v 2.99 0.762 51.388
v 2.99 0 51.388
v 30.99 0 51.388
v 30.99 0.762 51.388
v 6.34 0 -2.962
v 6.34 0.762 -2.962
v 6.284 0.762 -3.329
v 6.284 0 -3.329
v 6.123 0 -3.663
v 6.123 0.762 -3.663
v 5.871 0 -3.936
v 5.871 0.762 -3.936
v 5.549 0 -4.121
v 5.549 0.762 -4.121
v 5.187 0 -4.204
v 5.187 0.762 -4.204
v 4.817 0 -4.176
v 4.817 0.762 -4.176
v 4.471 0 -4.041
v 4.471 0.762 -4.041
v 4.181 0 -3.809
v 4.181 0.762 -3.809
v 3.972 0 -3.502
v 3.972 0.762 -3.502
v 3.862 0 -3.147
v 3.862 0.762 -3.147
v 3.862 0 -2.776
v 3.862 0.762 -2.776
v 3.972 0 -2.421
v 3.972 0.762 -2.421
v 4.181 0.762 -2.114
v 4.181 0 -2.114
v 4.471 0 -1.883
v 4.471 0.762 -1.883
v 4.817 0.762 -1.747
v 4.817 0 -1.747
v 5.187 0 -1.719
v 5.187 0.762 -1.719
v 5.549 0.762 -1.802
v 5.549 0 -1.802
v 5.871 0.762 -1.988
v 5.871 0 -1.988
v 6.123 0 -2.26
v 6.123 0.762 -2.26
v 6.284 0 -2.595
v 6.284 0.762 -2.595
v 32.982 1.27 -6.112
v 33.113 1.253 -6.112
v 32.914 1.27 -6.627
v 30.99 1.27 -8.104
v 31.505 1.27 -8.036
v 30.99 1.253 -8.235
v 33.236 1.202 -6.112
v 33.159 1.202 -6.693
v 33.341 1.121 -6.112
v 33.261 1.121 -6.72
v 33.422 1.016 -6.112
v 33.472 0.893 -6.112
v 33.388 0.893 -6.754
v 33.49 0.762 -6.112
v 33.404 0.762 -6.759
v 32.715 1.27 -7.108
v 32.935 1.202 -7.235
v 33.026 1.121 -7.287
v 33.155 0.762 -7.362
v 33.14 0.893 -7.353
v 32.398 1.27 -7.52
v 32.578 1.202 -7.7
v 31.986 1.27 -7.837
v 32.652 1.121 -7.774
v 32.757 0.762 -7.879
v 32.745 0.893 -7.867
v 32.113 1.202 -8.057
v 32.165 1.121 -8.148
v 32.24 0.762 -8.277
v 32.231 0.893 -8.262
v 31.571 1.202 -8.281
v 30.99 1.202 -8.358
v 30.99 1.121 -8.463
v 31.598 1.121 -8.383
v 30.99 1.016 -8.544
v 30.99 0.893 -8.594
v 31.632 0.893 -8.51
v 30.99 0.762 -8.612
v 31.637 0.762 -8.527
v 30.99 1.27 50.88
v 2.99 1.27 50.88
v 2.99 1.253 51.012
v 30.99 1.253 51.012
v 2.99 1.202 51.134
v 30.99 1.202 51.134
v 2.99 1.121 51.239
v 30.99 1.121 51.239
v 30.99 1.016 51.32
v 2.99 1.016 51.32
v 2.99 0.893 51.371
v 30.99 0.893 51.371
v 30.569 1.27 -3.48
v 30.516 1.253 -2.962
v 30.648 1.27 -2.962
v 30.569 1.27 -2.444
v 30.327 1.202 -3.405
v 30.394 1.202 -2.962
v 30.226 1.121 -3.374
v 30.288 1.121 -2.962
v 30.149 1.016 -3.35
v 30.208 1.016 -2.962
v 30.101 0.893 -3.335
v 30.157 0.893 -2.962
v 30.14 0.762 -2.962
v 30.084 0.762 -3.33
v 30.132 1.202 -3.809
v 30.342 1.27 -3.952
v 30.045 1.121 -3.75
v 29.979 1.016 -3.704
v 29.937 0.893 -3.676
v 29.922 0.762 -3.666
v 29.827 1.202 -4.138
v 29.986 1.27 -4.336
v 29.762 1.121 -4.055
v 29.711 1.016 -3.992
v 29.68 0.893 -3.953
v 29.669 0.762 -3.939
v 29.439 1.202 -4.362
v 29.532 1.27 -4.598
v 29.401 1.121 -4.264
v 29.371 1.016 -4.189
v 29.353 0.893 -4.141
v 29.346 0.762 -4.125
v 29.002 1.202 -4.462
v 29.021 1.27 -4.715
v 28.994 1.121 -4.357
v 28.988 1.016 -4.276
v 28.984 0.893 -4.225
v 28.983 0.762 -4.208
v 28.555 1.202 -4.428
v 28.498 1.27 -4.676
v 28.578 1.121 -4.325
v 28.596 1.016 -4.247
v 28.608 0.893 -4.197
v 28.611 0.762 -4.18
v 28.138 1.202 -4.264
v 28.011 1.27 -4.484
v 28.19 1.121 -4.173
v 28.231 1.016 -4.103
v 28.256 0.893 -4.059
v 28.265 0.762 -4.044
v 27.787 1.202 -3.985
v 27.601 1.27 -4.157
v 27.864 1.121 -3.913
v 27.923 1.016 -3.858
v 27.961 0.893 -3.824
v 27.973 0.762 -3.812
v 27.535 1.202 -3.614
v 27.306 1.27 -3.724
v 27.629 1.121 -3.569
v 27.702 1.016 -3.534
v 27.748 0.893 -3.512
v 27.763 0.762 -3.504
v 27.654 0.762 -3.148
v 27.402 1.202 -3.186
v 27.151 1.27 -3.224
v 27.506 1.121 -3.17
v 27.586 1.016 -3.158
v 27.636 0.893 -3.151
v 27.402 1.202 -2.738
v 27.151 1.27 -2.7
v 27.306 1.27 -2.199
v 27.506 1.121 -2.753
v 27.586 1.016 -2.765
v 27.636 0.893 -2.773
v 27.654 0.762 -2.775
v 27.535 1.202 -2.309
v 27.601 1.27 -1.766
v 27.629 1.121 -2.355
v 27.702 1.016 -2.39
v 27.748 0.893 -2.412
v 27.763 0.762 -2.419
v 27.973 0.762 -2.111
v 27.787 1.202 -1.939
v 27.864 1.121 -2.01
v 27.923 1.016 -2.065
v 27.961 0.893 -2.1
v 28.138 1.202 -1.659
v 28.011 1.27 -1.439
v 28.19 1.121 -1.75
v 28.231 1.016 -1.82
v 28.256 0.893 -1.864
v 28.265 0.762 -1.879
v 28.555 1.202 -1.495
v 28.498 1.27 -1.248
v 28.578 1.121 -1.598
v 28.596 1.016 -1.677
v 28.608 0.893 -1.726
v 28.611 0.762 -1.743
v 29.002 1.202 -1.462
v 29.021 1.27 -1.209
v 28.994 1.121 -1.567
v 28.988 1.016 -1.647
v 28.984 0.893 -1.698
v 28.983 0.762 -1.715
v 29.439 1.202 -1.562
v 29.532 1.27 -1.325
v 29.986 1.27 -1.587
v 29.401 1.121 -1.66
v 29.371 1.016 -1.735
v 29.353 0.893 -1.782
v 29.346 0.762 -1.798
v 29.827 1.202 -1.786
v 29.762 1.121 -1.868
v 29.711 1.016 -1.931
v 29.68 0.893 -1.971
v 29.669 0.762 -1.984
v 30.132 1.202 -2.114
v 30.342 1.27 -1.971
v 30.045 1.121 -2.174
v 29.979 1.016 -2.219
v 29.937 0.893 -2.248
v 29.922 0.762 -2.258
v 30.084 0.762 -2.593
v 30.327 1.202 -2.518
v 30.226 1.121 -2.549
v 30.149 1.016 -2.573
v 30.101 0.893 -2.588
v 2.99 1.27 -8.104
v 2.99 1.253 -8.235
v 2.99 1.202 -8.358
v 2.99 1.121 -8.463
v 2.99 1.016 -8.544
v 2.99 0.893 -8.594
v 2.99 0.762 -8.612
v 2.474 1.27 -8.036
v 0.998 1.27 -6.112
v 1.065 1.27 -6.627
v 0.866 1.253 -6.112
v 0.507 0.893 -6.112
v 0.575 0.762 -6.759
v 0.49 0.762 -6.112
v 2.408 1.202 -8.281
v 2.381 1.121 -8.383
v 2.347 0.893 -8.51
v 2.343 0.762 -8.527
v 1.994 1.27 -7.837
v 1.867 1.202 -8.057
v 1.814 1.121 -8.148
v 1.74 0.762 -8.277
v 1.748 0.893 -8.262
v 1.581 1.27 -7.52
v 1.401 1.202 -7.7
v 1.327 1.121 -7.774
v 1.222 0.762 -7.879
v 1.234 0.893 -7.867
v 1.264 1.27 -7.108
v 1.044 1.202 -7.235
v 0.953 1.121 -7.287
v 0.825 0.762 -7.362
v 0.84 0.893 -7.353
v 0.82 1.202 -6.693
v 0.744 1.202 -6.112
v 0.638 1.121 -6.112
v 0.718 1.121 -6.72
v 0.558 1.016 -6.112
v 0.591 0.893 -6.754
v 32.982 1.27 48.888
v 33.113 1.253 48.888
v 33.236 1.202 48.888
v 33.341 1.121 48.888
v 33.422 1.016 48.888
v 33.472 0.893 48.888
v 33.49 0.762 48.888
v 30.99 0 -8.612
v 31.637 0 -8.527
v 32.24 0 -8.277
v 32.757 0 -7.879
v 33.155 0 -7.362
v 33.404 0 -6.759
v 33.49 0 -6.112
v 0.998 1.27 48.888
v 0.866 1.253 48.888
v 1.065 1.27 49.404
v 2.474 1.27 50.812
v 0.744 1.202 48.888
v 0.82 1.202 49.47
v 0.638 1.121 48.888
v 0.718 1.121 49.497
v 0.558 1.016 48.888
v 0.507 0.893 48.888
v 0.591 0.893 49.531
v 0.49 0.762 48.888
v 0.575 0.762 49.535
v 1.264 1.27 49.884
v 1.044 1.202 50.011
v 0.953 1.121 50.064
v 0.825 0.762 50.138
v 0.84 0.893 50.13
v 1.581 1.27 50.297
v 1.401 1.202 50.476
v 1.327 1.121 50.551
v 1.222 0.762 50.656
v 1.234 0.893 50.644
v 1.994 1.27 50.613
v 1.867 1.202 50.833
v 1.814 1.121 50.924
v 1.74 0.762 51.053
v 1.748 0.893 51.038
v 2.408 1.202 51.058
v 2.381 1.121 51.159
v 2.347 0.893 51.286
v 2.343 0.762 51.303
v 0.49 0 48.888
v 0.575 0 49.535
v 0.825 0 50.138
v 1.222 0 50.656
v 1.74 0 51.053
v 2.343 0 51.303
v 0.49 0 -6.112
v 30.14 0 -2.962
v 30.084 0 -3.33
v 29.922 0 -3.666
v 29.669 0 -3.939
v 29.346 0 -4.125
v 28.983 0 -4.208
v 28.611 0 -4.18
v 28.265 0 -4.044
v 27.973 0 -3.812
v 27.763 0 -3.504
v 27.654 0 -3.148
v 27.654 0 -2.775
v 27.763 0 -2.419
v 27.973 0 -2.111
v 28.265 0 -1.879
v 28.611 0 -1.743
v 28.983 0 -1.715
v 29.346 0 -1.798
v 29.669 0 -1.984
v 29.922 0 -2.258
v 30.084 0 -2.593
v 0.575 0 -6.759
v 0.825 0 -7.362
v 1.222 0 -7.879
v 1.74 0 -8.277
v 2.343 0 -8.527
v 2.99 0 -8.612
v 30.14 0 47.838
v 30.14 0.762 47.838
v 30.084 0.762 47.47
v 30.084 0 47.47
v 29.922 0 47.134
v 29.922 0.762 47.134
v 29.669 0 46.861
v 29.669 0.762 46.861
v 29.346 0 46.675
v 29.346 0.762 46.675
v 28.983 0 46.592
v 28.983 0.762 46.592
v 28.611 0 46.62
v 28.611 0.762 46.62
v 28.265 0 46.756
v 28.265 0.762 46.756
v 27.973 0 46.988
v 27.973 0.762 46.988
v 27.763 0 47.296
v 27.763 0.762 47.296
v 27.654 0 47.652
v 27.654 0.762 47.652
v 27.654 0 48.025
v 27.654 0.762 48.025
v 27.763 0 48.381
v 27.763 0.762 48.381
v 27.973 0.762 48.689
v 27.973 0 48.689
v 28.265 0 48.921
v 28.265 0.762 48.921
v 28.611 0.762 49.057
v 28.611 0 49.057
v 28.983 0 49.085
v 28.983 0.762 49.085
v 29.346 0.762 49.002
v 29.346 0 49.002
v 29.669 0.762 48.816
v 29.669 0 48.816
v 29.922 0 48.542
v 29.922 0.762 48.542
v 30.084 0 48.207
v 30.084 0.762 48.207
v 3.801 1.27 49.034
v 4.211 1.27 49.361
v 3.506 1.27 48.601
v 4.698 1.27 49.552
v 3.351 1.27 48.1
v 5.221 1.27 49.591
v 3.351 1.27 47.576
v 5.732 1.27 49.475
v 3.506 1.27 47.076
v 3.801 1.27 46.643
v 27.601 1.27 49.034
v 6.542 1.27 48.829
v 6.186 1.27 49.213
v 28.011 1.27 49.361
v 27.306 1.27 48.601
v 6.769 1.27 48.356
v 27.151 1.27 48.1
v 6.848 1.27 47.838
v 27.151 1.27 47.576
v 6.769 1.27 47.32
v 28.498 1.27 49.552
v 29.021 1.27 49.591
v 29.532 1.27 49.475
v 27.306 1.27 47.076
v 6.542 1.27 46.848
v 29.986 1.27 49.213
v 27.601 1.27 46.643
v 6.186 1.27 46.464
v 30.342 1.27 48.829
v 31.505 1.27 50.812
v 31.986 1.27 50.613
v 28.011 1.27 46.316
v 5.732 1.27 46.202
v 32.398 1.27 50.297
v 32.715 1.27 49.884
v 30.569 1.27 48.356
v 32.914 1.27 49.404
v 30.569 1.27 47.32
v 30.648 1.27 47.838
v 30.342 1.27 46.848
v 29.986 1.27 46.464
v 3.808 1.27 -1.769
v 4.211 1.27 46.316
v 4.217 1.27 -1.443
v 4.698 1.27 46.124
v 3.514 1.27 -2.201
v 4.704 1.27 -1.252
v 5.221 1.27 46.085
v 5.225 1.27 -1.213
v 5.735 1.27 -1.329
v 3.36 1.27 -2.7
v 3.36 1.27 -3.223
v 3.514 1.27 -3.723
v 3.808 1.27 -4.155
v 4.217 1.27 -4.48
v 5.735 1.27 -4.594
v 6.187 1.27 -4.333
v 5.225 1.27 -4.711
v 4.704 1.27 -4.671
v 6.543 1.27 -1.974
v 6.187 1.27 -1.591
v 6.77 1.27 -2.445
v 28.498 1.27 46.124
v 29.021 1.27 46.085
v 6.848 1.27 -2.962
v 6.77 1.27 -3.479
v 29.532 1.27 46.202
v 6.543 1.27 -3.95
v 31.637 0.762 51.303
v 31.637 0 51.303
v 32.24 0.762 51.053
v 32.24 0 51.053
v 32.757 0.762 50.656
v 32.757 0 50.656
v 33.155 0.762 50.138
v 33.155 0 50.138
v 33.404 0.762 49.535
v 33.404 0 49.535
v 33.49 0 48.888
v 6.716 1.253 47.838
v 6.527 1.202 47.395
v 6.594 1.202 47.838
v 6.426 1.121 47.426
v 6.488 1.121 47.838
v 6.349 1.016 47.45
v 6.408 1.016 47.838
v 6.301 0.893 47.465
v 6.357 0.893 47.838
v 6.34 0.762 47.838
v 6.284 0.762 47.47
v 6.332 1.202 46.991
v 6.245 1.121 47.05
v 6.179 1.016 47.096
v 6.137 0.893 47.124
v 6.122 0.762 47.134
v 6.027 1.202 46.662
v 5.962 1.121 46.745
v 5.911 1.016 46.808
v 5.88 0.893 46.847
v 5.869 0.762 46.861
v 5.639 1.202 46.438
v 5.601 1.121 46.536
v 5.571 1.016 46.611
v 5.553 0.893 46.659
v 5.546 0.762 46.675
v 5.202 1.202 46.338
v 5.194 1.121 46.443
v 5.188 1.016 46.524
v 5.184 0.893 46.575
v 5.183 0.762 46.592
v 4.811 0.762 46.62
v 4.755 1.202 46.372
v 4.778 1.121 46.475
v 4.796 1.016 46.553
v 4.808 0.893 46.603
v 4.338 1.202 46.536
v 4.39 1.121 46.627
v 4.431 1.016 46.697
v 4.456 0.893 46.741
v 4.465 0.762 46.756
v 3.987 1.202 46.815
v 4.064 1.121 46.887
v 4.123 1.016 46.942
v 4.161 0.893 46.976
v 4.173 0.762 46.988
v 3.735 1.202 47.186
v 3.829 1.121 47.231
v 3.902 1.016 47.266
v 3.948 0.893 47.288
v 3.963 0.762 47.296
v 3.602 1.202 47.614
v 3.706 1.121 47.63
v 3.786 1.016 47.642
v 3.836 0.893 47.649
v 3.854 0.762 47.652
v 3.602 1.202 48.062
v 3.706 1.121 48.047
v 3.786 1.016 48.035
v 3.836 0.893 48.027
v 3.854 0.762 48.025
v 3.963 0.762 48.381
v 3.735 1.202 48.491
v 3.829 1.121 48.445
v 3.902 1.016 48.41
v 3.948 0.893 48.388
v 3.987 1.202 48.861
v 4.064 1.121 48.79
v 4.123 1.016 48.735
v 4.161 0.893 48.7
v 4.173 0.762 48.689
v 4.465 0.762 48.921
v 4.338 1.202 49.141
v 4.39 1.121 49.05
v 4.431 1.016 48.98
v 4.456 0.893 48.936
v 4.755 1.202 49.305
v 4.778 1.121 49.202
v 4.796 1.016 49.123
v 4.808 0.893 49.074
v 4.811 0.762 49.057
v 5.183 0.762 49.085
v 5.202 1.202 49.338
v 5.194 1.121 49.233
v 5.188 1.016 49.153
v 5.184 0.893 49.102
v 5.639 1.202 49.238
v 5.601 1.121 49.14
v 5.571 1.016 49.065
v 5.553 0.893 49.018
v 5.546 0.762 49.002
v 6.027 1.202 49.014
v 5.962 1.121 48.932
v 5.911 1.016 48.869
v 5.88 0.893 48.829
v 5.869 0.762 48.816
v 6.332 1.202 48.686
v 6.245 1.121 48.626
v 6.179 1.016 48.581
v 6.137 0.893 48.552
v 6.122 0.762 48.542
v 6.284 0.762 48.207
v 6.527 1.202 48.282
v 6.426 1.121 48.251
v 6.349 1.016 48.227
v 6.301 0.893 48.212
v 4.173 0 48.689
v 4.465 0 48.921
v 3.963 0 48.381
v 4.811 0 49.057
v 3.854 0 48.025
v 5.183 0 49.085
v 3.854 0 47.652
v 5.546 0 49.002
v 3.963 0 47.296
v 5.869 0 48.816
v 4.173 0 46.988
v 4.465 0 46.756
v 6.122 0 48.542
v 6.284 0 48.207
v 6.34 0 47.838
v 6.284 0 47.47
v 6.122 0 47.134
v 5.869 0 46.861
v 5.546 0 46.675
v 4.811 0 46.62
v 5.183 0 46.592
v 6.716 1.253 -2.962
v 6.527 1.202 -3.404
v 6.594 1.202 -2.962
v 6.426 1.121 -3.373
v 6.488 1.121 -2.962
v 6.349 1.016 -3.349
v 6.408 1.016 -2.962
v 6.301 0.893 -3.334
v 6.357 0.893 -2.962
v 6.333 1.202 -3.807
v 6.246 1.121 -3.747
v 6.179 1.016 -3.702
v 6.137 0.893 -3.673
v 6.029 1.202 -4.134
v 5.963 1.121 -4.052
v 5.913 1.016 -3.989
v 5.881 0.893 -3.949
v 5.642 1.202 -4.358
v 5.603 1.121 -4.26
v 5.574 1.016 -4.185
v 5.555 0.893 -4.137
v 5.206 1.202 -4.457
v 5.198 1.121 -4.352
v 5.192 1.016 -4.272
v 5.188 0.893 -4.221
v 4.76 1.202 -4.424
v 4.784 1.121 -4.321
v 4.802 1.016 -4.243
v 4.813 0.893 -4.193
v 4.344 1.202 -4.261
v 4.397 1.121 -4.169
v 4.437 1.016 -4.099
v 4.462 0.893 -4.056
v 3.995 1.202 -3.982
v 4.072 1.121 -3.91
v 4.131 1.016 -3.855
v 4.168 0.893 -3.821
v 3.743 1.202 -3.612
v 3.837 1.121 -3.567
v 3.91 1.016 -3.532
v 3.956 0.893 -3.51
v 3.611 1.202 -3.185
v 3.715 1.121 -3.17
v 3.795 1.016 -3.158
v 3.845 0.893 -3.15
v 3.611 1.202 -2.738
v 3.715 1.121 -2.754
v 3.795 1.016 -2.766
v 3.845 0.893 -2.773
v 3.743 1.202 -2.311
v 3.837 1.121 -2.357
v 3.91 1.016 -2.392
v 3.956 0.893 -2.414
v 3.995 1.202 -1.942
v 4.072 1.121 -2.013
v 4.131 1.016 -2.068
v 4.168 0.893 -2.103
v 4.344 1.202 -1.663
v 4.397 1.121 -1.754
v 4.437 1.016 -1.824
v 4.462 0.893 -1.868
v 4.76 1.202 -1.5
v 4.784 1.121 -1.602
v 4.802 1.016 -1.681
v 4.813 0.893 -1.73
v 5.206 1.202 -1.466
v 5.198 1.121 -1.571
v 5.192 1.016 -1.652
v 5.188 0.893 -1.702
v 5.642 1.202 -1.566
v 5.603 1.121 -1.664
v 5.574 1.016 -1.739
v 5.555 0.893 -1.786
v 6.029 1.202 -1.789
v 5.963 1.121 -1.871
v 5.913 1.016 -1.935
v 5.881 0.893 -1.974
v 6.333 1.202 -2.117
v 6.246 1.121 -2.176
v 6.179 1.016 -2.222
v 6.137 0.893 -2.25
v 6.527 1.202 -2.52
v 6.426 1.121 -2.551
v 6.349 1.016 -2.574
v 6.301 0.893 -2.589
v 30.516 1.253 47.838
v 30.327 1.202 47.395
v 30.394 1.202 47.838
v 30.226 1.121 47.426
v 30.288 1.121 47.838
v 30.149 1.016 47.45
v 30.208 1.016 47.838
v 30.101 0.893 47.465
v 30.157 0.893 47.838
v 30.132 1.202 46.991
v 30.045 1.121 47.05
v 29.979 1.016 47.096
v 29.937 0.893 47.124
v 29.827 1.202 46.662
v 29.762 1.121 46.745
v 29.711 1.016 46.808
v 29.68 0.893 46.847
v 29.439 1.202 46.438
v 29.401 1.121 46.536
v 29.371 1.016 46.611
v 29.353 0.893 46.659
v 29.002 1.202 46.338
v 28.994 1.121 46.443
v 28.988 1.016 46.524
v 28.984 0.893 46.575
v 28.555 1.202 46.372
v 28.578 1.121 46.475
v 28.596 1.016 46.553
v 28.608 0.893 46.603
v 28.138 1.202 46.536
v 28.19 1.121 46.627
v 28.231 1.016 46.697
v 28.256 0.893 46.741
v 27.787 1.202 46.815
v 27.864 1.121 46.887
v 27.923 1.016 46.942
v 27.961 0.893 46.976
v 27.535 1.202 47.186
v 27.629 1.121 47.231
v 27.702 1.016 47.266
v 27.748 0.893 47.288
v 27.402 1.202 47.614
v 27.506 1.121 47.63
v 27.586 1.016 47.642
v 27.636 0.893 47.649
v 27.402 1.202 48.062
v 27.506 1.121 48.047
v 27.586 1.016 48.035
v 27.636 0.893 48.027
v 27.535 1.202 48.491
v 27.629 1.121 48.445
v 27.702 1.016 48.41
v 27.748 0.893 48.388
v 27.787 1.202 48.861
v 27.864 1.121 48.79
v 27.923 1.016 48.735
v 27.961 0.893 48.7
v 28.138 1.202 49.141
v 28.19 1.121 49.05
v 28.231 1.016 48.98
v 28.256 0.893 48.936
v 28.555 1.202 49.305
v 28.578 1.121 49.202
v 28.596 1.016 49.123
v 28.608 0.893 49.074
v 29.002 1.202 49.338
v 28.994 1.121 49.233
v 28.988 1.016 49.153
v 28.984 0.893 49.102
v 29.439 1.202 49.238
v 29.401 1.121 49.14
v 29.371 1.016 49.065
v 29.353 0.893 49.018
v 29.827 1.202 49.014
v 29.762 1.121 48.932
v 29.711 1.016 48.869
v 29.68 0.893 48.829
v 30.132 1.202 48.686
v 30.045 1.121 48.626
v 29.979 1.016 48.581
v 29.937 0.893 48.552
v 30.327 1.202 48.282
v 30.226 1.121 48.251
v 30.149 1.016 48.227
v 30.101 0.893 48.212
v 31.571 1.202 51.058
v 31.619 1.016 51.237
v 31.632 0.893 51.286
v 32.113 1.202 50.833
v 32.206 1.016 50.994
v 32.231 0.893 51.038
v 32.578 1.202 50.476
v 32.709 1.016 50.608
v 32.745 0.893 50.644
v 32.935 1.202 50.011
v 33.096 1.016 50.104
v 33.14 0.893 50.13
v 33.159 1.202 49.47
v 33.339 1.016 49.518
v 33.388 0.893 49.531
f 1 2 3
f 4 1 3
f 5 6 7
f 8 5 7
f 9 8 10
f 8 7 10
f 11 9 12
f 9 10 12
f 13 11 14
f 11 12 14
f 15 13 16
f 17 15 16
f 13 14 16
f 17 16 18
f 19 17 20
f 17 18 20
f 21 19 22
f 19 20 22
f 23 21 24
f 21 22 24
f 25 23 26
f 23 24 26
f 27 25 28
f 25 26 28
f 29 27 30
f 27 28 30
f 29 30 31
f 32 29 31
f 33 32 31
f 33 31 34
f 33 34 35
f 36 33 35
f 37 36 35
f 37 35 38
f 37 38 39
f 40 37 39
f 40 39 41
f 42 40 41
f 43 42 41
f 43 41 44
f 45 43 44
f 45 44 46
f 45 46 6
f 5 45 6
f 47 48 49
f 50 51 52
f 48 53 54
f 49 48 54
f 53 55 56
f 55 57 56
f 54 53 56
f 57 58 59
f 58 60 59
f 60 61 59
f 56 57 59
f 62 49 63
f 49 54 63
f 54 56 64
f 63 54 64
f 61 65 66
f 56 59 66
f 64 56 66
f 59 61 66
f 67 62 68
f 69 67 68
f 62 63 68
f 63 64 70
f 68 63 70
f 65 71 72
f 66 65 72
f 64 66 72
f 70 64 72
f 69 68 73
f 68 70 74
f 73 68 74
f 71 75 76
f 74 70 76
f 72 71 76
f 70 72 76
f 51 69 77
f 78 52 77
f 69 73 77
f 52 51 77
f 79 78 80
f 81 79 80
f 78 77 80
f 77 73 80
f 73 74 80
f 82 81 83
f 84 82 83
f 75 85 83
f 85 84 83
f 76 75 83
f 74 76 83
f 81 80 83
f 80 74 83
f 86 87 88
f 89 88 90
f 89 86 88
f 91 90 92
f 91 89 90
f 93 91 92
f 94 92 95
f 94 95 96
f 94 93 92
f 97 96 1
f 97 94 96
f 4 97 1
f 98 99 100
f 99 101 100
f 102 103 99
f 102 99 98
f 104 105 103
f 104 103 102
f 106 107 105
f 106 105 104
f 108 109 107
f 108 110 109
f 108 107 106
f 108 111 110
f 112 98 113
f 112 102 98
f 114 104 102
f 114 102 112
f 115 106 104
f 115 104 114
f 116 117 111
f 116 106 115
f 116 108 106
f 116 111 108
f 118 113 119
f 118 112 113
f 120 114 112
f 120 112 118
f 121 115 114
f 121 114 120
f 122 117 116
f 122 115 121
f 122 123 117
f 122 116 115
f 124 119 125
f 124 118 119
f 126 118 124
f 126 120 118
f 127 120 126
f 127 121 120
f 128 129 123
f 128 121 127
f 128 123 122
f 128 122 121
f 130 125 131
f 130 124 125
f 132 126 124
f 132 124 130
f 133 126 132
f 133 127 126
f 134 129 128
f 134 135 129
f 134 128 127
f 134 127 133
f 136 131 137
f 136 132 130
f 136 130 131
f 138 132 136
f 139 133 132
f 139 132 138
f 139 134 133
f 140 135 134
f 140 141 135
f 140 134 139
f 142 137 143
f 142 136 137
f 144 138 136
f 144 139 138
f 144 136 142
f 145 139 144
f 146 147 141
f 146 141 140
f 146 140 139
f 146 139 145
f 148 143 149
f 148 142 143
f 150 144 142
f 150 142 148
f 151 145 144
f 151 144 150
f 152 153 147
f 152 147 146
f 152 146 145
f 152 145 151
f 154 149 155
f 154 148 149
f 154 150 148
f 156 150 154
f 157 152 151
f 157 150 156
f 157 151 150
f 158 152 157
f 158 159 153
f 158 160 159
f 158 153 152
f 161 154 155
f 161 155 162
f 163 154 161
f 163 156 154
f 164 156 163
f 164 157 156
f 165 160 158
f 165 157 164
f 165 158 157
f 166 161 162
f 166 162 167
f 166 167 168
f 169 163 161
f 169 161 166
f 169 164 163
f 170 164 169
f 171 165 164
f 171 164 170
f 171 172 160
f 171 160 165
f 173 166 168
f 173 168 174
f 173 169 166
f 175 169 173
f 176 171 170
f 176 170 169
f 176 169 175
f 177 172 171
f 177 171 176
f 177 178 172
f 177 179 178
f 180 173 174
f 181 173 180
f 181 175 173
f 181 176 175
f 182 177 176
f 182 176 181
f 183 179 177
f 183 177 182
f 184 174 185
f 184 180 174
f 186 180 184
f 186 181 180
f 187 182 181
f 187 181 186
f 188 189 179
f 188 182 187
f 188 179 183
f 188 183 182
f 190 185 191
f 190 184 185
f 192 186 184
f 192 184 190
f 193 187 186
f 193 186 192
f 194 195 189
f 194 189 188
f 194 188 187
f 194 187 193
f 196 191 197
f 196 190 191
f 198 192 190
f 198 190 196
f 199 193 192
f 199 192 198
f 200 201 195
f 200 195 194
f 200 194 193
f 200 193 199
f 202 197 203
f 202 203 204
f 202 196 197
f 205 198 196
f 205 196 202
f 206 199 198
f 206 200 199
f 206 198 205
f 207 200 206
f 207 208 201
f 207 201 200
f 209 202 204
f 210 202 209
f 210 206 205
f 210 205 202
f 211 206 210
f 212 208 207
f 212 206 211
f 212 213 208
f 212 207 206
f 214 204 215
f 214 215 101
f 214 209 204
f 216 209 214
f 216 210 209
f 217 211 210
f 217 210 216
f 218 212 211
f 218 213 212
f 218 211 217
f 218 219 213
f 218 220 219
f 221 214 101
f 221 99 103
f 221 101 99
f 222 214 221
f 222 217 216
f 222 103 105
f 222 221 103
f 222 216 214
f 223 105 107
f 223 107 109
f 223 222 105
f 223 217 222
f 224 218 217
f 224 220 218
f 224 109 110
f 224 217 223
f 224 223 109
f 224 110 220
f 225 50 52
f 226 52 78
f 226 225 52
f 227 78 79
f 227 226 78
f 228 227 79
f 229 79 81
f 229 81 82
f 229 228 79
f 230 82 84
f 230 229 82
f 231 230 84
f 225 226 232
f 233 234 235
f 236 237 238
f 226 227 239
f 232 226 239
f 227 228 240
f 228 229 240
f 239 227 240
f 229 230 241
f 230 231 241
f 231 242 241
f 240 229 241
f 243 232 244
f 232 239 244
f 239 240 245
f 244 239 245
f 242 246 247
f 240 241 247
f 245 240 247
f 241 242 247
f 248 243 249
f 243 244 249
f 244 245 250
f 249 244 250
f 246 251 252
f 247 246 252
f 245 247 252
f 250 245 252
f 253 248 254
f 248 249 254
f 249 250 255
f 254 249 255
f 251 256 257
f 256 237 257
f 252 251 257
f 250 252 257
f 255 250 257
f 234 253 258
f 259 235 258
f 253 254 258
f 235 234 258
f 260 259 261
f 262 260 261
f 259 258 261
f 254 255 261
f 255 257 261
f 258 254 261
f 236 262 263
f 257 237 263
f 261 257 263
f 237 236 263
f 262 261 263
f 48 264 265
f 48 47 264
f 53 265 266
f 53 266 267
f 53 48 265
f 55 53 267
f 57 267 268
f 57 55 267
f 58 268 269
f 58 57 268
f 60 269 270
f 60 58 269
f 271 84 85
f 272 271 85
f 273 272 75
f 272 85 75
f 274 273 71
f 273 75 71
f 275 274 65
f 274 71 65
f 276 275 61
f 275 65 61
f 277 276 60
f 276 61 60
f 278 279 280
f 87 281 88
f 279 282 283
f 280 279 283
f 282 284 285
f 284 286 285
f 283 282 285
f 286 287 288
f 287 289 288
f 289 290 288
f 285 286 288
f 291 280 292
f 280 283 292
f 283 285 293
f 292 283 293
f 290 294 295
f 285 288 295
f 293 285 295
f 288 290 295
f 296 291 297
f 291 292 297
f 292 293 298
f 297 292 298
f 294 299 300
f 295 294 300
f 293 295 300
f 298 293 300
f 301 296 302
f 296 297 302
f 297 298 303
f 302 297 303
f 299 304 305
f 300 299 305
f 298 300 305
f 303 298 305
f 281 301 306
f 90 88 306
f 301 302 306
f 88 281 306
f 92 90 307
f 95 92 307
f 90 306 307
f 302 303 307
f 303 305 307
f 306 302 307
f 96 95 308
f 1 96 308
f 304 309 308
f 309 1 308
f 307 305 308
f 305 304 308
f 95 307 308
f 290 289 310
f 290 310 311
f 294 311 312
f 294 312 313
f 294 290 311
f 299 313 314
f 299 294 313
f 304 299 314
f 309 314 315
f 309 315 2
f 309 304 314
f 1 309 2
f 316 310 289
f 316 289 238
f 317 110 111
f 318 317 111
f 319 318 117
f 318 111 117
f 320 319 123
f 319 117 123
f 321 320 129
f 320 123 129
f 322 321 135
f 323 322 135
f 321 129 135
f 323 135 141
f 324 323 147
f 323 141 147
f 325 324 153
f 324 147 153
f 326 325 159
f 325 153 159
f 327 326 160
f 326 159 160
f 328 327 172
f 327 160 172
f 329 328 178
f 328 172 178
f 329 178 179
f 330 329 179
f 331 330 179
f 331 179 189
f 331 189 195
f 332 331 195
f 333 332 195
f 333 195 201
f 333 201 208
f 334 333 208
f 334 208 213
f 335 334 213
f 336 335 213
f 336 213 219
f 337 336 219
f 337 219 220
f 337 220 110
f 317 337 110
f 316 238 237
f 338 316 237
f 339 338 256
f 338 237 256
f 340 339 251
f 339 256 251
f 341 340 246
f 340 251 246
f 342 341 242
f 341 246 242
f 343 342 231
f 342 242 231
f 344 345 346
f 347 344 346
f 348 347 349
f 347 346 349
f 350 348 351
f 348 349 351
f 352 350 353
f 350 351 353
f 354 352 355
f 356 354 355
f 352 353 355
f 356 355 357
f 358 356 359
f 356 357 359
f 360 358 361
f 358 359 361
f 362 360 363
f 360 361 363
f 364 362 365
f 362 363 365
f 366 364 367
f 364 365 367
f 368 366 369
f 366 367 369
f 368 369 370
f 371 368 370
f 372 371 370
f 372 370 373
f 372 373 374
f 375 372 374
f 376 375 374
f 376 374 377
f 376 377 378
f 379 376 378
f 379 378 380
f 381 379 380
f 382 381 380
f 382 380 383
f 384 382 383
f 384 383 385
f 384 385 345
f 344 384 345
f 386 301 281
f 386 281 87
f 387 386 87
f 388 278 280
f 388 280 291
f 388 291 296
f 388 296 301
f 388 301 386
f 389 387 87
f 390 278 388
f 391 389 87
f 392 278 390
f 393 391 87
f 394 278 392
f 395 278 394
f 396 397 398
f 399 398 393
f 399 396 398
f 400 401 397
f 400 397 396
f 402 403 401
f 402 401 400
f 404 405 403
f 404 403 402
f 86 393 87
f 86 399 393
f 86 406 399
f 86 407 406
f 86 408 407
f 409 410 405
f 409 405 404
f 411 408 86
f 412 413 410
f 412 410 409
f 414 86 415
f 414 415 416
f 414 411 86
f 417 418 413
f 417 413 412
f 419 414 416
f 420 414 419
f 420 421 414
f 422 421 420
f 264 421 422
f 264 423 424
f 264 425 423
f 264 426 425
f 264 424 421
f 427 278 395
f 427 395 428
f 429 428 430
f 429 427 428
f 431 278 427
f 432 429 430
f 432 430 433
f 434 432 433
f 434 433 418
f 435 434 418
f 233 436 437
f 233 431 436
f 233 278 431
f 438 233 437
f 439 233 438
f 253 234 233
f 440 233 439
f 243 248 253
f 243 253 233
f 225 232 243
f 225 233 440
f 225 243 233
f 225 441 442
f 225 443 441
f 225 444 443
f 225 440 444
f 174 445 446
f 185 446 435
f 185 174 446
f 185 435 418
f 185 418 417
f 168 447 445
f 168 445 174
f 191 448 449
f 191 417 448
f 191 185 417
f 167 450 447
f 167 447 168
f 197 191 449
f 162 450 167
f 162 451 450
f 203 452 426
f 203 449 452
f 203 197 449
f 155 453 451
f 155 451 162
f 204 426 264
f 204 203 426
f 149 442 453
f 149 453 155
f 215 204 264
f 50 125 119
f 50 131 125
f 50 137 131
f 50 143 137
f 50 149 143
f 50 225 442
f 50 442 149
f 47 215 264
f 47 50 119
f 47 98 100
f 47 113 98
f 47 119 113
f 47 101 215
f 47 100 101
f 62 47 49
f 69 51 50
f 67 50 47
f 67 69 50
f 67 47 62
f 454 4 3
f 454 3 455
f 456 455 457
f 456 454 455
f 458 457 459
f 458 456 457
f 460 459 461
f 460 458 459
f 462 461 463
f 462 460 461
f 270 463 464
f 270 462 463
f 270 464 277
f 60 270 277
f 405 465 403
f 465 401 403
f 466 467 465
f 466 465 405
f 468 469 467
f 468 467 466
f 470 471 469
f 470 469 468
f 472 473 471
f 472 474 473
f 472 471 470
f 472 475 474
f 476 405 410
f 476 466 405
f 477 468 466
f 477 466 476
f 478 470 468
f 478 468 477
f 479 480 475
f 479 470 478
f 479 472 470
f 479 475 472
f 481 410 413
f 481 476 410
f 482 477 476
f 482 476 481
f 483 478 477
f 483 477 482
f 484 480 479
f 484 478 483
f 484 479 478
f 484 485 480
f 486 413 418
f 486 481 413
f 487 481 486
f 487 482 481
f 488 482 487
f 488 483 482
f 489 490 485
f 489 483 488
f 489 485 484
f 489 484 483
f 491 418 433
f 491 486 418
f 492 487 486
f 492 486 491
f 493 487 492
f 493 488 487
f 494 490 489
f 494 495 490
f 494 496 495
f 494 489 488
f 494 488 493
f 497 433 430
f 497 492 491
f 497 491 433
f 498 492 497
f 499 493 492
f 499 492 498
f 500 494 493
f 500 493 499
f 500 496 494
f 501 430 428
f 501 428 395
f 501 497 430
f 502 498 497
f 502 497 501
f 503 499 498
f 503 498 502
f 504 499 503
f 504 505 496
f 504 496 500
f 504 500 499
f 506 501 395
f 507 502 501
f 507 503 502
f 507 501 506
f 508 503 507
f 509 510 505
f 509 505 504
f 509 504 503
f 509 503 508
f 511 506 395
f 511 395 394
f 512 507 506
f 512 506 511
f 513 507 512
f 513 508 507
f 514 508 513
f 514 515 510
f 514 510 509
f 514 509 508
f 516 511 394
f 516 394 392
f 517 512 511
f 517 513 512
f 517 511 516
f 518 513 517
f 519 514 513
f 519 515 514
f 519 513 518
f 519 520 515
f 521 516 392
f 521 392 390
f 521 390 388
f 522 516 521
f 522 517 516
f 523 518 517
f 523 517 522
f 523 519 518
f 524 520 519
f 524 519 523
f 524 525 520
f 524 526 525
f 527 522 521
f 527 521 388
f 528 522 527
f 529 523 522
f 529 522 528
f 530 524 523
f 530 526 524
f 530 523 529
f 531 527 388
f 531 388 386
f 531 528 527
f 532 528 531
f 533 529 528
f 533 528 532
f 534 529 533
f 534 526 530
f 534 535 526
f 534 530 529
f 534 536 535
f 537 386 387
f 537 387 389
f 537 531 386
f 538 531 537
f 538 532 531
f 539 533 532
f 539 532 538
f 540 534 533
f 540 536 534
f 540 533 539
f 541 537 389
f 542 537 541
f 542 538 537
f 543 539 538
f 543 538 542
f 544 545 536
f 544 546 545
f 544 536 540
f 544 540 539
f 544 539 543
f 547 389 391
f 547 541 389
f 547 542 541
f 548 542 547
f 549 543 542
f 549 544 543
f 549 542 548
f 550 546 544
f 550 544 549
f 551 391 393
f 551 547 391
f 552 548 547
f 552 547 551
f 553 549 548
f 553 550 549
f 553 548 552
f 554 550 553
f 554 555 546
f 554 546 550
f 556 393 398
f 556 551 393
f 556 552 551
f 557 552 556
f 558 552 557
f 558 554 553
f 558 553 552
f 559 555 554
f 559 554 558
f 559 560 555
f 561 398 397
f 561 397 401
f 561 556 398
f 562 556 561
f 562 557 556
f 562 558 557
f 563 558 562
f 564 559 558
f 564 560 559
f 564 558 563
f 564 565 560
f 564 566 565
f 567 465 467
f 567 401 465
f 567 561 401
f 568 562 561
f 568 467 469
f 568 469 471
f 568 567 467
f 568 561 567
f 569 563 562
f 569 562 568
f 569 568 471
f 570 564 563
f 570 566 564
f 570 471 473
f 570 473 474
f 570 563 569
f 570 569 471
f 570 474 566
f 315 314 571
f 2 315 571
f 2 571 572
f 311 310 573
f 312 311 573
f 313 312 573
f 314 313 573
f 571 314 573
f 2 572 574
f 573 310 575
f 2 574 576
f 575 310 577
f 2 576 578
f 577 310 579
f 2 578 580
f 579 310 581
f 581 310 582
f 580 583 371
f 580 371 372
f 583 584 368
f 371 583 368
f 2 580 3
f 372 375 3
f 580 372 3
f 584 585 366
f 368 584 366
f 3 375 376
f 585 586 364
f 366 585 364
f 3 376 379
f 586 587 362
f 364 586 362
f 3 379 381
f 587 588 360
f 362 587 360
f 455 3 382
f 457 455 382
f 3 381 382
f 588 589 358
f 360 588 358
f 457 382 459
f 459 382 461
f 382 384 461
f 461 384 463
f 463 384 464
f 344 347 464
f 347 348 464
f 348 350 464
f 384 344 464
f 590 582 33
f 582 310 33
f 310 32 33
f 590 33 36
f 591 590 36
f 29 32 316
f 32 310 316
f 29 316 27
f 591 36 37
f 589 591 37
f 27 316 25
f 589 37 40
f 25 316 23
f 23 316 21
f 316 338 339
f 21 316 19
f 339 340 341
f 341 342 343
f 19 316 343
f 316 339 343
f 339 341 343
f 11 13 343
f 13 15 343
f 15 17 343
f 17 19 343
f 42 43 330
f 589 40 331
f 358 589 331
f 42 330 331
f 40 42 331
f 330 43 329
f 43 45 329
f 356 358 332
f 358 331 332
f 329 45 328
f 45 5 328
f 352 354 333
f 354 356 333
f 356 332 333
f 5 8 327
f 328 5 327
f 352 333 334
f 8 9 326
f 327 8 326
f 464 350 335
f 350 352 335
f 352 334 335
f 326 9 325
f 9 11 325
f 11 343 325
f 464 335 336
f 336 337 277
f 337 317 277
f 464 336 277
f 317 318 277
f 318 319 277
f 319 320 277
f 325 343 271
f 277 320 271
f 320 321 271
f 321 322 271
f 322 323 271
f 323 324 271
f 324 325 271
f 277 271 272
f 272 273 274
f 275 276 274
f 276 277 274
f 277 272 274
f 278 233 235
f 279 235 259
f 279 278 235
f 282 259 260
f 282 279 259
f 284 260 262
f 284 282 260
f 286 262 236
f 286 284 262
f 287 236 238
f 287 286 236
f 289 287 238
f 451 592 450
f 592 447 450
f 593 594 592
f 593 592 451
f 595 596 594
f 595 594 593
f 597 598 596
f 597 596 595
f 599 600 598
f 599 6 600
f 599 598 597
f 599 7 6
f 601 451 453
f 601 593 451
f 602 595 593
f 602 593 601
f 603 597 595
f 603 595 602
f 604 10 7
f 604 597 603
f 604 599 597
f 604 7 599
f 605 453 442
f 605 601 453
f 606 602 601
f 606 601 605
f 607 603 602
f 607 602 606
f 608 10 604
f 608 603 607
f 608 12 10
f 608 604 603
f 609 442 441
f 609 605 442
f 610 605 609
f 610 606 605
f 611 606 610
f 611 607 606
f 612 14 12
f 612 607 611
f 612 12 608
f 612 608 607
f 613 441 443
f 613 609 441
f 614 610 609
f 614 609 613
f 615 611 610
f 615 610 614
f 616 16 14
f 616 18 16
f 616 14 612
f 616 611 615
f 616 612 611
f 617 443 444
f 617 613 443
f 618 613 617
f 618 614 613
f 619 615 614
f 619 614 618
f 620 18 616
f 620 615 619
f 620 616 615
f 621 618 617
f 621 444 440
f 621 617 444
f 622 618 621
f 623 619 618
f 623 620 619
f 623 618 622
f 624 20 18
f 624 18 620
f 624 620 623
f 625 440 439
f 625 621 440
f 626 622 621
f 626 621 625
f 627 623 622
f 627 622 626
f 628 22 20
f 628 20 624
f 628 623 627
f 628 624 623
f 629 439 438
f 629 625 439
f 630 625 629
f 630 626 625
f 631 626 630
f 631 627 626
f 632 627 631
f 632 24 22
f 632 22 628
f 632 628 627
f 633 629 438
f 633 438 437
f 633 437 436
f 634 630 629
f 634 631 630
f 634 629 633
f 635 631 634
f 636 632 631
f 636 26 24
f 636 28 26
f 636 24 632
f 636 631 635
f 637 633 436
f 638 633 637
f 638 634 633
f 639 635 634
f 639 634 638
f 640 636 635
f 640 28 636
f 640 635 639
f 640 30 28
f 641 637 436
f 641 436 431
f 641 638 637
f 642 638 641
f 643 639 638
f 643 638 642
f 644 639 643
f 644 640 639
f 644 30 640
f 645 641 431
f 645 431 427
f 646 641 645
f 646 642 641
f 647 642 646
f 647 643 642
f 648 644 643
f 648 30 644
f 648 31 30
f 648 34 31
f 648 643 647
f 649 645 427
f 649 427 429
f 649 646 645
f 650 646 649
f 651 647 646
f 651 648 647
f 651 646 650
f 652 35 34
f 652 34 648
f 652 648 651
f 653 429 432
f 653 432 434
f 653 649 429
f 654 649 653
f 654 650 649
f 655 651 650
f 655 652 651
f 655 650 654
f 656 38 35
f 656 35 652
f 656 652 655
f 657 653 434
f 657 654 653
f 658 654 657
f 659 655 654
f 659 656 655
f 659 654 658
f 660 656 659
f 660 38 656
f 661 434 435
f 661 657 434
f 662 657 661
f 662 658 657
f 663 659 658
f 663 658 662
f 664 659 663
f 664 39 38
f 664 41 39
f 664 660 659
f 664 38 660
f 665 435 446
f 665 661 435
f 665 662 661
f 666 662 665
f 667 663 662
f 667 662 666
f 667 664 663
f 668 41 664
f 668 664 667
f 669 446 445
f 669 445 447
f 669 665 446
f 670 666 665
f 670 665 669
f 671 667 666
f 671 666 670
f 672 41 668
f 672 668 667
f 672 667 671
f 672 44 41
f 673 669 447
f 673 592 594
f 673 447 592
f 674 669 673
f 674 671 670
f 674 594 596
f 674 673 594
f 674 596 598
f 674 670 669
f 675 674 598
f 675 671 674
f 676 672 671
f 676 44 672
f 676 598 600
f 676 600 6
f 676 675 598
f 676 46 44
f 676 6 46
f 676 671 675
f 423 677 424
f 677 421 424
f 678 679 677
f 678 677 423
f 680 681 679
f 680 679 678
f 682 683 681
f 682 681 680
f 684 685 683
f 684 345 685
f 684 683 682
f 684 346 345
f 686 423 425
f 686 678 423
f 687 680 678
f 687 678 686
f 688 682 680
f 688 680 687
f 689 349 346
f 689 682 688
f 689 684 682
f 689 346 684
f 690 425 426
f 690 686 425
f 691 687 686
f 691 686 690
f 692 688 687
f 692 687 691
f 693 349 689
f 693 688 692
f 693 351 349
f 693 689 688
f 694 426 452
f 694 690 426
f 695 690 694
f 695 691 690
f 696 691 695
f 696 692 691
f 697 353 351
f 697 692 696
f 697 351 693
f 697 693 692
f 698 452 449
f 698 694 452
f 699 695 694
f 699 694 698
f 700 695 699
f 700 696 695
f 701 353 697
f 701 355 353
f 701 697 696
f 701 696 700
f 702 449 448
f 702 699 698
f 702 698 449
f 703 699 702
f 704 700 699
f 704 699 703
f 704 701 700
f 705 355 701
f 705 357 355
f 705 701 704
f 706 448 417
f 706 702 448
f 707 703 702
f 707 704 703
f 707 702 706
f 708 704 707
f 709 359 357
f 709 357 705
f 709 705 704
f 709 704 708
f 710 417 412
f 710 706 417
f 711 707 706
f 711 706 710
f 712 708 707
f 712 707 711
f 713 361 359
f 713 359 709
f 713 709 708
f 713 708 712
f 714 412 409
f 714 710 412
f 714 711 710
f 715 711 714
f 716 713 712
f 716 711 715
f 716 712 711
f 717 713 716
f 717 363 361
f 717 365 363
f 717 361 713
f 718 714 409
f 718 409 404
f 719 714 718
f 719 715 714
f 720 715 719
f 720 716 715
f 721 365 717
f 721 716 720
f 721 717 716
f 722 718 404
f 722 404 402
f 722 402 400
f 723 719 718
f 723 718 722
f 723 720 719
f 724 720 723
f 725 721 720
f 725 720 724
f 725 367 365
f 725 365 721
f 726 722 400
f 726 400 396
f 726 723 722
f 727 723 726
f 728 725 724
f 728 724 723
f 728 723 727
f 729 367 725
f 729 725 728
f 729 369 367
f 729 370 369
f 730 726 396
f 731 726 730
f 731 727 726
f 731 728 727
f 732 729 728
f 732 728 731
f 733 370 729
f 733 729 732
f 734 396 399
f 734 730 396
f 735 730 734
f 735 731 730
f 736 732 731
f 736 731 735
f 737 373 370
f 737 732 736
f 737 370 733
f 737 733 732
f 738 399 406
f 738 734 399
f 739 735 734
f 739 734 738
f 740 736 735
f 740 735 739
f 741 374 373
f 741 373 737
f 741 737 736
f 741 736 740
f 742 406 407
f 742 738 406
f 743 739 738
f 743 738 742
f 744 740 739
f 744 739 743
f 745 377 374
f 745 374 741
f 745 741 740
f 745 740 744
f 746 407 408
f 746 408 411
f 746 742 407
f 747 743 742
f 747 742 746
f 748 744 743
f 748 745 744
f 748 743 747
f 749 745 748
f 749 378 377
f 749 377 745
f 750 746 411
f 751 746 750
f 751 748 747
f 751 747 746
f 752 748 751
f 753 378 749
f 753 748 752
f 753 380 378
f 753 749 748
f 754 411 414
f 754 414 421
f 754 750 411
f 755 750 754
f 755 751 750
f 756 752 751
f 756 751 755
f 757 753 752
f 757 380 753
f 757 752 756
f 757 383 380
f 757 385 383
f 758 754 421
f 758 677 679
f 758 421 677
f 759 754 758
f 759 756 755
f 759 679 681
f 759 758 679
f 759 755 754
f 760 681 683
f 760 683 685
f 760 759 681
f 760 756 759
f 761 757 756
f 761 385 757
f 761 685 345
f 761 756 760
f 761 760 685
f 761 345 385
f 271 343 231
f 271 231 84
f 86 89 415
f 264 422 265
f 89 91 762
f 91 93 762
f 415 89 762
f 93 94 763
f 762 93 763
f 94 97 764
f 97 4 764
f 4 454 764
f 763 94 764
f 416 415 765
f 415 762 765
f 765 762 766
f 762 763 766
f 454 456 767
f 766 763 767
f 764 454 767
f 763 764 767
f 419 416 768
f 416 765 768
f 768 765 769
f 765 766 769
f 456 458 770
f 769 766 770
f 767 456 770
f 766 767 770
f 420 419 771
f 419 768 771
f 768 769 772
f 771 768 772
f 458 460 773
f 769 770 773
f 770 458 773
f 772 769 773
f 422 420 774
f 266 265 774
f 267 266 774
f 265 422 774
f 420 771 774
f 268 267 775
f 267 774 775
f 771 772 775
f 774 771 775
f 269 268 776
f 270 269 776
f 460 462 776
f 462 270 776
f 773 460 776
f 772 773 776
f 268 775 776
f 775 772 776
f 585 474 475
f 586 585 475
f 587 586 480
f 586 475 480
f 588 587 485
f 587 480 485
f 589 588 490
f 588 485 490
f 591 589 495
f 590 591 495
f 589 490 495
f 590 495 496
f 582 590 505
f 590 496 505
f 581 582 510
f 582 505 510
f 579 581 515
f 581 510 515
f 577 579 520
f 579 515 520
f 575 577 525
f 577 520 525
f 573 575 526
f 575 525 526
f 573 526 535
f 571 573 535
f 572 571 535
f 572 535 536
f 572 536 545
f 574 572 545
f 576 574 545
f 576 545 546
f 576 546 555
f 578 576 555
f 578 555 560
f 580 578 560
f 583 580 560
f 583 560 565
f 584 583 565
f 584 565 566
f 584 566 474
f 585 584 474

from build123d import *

# Parameters (mm, degrees)
SKETCH1_W           = 33
SKETCH1_H           = 60
BOSS_EXTRUDE1_DEPTH = 1.27
CUT_EXTRUDE1_REACH  = 3.27
SKETCH2_R           = 1.245715159
SKETCH2_R_2         = 1.25
FILLET1_R           = 2.50000008
FILLET2_R           = 0.508


with BuildPart() as part:
    # Sketch1 → Boss-Extrude1 (new body)
    with BuildSketch(Plane(origin=(0, 0, 0), x_dir=(1, 0, 0), z_dir=(0, 1, 0))):
        with Locations((16.989591658, -21.38828823)):
            Rectangle(SKETCH1_W, SKETCH1_H)
    extrude(amount=BOSS_EXTRUDE1_DEPTH)

    # Sketch2 → Cut-Extrude1 (cut, up to next)
    with BuildSketch(Plane(origin=(0, 1.27, 0), x_dir=(1, 0, 0), z_dir=(0, 1, 0)), mode=Mode.PRIVATE) as cut_extrude1_sk1:
        with Locations((5.093876499, 2.96171177)):
            Circle(SKETCH2_R)
    cut_extrude1_tool1 = extrude(cut_extrude1_sk1.sketch, amount=-CUT_EXTRUDE1_REACH, mode=Mode.PRIVATE) & part.part
    add(cut_extrude1_tool1.solids().sort_by_distance((5.093876, 1.27, -2.961712))[0], mode=Mode.SUBTRACT)
    # Sketch2 → Cut-Extrude1 (cut, up to next)
    with BuildSketch(Plane(origin=(0, 1.27, 0), x_dir=(1, 0, 0), z_dir=(0, 1, 0)), mode=Mode.PRIVATE) as cut_extrude1_sk2:
        with Locations((28.889591658, 2.96171177)):
            Circle(SKETCH2_R_2)
    cut_extrude1_tool2 = extrude(cut_extrude1_sk2.sketch, amount=-CUT_EXTRUDE1_REACH, mode=Mode.PRIVATE) & part.part
    add(cut_extrude1_tool2.solids().sort_by_distance((28.889592, 1.27, -2.961712))[0], mode=Mode.SUBTRACT)
    # Sketch2 → Cut-Extrude1 (cut, up to next)
    with BuildSketch(Plane(origin=(0, 1.27, 0), x_dir=(1, 0, 0), z_dir=(0, 1, 0)), mode=Mode.PRIVATE) as cut_extrude1_sk3:
        with Locations((5.089591658, -47.83828823)):
            Circle(SKETCH2_R_2)
    cut_extrude1_tool3 = extrude(cut_extrude1_sk3.sketch, amount=-CUT_EXTRUDE1_REACH, mode=Mode.PRIVATE) & part.part
    add(cut_extrude1_tool3.solids().sort_by_distance((5.089592, 1.27, 47.838288))[0], mode=Mode.SUBTRACT)
    # Sketch2 → Cut-Extrude1 (cut, up to next)
    with BuildSketch(Plane(origin=(0, 1.27, 0), x_dir=(1, 0, 0), z_dir=(0, 1, 0)), mode=Mode.PRIVATE) as cut_extrude1_sk4:
        with Locations((28.889591658, -47.83828823)):
            Circle(SKETCH2_R_2)
    cut_extrude1_tool4 = extrude(cut_extrude1_sk4.sketch, amount=-CUT_EXTRUDE1_REACH, mode=Mode.PRIVATE) & part.part
    add(cut_extrude1_tool4.solids().sort_by_distance((28.889592, 1.27, 47.838288))[0], mode=Mode.SUBTRACT)

    # Fillet1
    fillet1_edges = [part.edges().sort_by_distance(p)[0] for p in [
        (0.489591658, 0.635, -8.61171177),
        (33.489591658, 0.635, -8.61171177),
        (33.489591658, 0.635, 51.38828823),
        (0.489591658, 0.635, 51.38828823),
    ]]
    fillet(fillet1_edges, radius=FILLET1_R)

    # Fillet2
    fillet2_edges = [part.edges().sort_by_distance(p)[0] for p in [
        (27.639591658, 1.27, -2.96171177),
        (3.839591658, 1.27, 47.83828823),
        (27.639591658, 1.27, 47.83828823),
        (3.84816134, 1.27, -2.96171177),
        (33.489591658, 1.27, 21.38828823),
        (16.989591658, 1.27, 51.38828823),
        (0.489591658, 1.27, 21.38828823),
        (16.989591658, 1.27, -8.61171177),
        (32.757358588, 1.27, -7.8794787),
        (1.221824728, 1.27, -7.8794787),
        (1.221824728, 1.27, 50.65605516),
        (32.757358588, 1.27, 50.65605516),
    ]]
    fillet(fillet2_edges, radius=FILLET2_R)


solid = part.part
